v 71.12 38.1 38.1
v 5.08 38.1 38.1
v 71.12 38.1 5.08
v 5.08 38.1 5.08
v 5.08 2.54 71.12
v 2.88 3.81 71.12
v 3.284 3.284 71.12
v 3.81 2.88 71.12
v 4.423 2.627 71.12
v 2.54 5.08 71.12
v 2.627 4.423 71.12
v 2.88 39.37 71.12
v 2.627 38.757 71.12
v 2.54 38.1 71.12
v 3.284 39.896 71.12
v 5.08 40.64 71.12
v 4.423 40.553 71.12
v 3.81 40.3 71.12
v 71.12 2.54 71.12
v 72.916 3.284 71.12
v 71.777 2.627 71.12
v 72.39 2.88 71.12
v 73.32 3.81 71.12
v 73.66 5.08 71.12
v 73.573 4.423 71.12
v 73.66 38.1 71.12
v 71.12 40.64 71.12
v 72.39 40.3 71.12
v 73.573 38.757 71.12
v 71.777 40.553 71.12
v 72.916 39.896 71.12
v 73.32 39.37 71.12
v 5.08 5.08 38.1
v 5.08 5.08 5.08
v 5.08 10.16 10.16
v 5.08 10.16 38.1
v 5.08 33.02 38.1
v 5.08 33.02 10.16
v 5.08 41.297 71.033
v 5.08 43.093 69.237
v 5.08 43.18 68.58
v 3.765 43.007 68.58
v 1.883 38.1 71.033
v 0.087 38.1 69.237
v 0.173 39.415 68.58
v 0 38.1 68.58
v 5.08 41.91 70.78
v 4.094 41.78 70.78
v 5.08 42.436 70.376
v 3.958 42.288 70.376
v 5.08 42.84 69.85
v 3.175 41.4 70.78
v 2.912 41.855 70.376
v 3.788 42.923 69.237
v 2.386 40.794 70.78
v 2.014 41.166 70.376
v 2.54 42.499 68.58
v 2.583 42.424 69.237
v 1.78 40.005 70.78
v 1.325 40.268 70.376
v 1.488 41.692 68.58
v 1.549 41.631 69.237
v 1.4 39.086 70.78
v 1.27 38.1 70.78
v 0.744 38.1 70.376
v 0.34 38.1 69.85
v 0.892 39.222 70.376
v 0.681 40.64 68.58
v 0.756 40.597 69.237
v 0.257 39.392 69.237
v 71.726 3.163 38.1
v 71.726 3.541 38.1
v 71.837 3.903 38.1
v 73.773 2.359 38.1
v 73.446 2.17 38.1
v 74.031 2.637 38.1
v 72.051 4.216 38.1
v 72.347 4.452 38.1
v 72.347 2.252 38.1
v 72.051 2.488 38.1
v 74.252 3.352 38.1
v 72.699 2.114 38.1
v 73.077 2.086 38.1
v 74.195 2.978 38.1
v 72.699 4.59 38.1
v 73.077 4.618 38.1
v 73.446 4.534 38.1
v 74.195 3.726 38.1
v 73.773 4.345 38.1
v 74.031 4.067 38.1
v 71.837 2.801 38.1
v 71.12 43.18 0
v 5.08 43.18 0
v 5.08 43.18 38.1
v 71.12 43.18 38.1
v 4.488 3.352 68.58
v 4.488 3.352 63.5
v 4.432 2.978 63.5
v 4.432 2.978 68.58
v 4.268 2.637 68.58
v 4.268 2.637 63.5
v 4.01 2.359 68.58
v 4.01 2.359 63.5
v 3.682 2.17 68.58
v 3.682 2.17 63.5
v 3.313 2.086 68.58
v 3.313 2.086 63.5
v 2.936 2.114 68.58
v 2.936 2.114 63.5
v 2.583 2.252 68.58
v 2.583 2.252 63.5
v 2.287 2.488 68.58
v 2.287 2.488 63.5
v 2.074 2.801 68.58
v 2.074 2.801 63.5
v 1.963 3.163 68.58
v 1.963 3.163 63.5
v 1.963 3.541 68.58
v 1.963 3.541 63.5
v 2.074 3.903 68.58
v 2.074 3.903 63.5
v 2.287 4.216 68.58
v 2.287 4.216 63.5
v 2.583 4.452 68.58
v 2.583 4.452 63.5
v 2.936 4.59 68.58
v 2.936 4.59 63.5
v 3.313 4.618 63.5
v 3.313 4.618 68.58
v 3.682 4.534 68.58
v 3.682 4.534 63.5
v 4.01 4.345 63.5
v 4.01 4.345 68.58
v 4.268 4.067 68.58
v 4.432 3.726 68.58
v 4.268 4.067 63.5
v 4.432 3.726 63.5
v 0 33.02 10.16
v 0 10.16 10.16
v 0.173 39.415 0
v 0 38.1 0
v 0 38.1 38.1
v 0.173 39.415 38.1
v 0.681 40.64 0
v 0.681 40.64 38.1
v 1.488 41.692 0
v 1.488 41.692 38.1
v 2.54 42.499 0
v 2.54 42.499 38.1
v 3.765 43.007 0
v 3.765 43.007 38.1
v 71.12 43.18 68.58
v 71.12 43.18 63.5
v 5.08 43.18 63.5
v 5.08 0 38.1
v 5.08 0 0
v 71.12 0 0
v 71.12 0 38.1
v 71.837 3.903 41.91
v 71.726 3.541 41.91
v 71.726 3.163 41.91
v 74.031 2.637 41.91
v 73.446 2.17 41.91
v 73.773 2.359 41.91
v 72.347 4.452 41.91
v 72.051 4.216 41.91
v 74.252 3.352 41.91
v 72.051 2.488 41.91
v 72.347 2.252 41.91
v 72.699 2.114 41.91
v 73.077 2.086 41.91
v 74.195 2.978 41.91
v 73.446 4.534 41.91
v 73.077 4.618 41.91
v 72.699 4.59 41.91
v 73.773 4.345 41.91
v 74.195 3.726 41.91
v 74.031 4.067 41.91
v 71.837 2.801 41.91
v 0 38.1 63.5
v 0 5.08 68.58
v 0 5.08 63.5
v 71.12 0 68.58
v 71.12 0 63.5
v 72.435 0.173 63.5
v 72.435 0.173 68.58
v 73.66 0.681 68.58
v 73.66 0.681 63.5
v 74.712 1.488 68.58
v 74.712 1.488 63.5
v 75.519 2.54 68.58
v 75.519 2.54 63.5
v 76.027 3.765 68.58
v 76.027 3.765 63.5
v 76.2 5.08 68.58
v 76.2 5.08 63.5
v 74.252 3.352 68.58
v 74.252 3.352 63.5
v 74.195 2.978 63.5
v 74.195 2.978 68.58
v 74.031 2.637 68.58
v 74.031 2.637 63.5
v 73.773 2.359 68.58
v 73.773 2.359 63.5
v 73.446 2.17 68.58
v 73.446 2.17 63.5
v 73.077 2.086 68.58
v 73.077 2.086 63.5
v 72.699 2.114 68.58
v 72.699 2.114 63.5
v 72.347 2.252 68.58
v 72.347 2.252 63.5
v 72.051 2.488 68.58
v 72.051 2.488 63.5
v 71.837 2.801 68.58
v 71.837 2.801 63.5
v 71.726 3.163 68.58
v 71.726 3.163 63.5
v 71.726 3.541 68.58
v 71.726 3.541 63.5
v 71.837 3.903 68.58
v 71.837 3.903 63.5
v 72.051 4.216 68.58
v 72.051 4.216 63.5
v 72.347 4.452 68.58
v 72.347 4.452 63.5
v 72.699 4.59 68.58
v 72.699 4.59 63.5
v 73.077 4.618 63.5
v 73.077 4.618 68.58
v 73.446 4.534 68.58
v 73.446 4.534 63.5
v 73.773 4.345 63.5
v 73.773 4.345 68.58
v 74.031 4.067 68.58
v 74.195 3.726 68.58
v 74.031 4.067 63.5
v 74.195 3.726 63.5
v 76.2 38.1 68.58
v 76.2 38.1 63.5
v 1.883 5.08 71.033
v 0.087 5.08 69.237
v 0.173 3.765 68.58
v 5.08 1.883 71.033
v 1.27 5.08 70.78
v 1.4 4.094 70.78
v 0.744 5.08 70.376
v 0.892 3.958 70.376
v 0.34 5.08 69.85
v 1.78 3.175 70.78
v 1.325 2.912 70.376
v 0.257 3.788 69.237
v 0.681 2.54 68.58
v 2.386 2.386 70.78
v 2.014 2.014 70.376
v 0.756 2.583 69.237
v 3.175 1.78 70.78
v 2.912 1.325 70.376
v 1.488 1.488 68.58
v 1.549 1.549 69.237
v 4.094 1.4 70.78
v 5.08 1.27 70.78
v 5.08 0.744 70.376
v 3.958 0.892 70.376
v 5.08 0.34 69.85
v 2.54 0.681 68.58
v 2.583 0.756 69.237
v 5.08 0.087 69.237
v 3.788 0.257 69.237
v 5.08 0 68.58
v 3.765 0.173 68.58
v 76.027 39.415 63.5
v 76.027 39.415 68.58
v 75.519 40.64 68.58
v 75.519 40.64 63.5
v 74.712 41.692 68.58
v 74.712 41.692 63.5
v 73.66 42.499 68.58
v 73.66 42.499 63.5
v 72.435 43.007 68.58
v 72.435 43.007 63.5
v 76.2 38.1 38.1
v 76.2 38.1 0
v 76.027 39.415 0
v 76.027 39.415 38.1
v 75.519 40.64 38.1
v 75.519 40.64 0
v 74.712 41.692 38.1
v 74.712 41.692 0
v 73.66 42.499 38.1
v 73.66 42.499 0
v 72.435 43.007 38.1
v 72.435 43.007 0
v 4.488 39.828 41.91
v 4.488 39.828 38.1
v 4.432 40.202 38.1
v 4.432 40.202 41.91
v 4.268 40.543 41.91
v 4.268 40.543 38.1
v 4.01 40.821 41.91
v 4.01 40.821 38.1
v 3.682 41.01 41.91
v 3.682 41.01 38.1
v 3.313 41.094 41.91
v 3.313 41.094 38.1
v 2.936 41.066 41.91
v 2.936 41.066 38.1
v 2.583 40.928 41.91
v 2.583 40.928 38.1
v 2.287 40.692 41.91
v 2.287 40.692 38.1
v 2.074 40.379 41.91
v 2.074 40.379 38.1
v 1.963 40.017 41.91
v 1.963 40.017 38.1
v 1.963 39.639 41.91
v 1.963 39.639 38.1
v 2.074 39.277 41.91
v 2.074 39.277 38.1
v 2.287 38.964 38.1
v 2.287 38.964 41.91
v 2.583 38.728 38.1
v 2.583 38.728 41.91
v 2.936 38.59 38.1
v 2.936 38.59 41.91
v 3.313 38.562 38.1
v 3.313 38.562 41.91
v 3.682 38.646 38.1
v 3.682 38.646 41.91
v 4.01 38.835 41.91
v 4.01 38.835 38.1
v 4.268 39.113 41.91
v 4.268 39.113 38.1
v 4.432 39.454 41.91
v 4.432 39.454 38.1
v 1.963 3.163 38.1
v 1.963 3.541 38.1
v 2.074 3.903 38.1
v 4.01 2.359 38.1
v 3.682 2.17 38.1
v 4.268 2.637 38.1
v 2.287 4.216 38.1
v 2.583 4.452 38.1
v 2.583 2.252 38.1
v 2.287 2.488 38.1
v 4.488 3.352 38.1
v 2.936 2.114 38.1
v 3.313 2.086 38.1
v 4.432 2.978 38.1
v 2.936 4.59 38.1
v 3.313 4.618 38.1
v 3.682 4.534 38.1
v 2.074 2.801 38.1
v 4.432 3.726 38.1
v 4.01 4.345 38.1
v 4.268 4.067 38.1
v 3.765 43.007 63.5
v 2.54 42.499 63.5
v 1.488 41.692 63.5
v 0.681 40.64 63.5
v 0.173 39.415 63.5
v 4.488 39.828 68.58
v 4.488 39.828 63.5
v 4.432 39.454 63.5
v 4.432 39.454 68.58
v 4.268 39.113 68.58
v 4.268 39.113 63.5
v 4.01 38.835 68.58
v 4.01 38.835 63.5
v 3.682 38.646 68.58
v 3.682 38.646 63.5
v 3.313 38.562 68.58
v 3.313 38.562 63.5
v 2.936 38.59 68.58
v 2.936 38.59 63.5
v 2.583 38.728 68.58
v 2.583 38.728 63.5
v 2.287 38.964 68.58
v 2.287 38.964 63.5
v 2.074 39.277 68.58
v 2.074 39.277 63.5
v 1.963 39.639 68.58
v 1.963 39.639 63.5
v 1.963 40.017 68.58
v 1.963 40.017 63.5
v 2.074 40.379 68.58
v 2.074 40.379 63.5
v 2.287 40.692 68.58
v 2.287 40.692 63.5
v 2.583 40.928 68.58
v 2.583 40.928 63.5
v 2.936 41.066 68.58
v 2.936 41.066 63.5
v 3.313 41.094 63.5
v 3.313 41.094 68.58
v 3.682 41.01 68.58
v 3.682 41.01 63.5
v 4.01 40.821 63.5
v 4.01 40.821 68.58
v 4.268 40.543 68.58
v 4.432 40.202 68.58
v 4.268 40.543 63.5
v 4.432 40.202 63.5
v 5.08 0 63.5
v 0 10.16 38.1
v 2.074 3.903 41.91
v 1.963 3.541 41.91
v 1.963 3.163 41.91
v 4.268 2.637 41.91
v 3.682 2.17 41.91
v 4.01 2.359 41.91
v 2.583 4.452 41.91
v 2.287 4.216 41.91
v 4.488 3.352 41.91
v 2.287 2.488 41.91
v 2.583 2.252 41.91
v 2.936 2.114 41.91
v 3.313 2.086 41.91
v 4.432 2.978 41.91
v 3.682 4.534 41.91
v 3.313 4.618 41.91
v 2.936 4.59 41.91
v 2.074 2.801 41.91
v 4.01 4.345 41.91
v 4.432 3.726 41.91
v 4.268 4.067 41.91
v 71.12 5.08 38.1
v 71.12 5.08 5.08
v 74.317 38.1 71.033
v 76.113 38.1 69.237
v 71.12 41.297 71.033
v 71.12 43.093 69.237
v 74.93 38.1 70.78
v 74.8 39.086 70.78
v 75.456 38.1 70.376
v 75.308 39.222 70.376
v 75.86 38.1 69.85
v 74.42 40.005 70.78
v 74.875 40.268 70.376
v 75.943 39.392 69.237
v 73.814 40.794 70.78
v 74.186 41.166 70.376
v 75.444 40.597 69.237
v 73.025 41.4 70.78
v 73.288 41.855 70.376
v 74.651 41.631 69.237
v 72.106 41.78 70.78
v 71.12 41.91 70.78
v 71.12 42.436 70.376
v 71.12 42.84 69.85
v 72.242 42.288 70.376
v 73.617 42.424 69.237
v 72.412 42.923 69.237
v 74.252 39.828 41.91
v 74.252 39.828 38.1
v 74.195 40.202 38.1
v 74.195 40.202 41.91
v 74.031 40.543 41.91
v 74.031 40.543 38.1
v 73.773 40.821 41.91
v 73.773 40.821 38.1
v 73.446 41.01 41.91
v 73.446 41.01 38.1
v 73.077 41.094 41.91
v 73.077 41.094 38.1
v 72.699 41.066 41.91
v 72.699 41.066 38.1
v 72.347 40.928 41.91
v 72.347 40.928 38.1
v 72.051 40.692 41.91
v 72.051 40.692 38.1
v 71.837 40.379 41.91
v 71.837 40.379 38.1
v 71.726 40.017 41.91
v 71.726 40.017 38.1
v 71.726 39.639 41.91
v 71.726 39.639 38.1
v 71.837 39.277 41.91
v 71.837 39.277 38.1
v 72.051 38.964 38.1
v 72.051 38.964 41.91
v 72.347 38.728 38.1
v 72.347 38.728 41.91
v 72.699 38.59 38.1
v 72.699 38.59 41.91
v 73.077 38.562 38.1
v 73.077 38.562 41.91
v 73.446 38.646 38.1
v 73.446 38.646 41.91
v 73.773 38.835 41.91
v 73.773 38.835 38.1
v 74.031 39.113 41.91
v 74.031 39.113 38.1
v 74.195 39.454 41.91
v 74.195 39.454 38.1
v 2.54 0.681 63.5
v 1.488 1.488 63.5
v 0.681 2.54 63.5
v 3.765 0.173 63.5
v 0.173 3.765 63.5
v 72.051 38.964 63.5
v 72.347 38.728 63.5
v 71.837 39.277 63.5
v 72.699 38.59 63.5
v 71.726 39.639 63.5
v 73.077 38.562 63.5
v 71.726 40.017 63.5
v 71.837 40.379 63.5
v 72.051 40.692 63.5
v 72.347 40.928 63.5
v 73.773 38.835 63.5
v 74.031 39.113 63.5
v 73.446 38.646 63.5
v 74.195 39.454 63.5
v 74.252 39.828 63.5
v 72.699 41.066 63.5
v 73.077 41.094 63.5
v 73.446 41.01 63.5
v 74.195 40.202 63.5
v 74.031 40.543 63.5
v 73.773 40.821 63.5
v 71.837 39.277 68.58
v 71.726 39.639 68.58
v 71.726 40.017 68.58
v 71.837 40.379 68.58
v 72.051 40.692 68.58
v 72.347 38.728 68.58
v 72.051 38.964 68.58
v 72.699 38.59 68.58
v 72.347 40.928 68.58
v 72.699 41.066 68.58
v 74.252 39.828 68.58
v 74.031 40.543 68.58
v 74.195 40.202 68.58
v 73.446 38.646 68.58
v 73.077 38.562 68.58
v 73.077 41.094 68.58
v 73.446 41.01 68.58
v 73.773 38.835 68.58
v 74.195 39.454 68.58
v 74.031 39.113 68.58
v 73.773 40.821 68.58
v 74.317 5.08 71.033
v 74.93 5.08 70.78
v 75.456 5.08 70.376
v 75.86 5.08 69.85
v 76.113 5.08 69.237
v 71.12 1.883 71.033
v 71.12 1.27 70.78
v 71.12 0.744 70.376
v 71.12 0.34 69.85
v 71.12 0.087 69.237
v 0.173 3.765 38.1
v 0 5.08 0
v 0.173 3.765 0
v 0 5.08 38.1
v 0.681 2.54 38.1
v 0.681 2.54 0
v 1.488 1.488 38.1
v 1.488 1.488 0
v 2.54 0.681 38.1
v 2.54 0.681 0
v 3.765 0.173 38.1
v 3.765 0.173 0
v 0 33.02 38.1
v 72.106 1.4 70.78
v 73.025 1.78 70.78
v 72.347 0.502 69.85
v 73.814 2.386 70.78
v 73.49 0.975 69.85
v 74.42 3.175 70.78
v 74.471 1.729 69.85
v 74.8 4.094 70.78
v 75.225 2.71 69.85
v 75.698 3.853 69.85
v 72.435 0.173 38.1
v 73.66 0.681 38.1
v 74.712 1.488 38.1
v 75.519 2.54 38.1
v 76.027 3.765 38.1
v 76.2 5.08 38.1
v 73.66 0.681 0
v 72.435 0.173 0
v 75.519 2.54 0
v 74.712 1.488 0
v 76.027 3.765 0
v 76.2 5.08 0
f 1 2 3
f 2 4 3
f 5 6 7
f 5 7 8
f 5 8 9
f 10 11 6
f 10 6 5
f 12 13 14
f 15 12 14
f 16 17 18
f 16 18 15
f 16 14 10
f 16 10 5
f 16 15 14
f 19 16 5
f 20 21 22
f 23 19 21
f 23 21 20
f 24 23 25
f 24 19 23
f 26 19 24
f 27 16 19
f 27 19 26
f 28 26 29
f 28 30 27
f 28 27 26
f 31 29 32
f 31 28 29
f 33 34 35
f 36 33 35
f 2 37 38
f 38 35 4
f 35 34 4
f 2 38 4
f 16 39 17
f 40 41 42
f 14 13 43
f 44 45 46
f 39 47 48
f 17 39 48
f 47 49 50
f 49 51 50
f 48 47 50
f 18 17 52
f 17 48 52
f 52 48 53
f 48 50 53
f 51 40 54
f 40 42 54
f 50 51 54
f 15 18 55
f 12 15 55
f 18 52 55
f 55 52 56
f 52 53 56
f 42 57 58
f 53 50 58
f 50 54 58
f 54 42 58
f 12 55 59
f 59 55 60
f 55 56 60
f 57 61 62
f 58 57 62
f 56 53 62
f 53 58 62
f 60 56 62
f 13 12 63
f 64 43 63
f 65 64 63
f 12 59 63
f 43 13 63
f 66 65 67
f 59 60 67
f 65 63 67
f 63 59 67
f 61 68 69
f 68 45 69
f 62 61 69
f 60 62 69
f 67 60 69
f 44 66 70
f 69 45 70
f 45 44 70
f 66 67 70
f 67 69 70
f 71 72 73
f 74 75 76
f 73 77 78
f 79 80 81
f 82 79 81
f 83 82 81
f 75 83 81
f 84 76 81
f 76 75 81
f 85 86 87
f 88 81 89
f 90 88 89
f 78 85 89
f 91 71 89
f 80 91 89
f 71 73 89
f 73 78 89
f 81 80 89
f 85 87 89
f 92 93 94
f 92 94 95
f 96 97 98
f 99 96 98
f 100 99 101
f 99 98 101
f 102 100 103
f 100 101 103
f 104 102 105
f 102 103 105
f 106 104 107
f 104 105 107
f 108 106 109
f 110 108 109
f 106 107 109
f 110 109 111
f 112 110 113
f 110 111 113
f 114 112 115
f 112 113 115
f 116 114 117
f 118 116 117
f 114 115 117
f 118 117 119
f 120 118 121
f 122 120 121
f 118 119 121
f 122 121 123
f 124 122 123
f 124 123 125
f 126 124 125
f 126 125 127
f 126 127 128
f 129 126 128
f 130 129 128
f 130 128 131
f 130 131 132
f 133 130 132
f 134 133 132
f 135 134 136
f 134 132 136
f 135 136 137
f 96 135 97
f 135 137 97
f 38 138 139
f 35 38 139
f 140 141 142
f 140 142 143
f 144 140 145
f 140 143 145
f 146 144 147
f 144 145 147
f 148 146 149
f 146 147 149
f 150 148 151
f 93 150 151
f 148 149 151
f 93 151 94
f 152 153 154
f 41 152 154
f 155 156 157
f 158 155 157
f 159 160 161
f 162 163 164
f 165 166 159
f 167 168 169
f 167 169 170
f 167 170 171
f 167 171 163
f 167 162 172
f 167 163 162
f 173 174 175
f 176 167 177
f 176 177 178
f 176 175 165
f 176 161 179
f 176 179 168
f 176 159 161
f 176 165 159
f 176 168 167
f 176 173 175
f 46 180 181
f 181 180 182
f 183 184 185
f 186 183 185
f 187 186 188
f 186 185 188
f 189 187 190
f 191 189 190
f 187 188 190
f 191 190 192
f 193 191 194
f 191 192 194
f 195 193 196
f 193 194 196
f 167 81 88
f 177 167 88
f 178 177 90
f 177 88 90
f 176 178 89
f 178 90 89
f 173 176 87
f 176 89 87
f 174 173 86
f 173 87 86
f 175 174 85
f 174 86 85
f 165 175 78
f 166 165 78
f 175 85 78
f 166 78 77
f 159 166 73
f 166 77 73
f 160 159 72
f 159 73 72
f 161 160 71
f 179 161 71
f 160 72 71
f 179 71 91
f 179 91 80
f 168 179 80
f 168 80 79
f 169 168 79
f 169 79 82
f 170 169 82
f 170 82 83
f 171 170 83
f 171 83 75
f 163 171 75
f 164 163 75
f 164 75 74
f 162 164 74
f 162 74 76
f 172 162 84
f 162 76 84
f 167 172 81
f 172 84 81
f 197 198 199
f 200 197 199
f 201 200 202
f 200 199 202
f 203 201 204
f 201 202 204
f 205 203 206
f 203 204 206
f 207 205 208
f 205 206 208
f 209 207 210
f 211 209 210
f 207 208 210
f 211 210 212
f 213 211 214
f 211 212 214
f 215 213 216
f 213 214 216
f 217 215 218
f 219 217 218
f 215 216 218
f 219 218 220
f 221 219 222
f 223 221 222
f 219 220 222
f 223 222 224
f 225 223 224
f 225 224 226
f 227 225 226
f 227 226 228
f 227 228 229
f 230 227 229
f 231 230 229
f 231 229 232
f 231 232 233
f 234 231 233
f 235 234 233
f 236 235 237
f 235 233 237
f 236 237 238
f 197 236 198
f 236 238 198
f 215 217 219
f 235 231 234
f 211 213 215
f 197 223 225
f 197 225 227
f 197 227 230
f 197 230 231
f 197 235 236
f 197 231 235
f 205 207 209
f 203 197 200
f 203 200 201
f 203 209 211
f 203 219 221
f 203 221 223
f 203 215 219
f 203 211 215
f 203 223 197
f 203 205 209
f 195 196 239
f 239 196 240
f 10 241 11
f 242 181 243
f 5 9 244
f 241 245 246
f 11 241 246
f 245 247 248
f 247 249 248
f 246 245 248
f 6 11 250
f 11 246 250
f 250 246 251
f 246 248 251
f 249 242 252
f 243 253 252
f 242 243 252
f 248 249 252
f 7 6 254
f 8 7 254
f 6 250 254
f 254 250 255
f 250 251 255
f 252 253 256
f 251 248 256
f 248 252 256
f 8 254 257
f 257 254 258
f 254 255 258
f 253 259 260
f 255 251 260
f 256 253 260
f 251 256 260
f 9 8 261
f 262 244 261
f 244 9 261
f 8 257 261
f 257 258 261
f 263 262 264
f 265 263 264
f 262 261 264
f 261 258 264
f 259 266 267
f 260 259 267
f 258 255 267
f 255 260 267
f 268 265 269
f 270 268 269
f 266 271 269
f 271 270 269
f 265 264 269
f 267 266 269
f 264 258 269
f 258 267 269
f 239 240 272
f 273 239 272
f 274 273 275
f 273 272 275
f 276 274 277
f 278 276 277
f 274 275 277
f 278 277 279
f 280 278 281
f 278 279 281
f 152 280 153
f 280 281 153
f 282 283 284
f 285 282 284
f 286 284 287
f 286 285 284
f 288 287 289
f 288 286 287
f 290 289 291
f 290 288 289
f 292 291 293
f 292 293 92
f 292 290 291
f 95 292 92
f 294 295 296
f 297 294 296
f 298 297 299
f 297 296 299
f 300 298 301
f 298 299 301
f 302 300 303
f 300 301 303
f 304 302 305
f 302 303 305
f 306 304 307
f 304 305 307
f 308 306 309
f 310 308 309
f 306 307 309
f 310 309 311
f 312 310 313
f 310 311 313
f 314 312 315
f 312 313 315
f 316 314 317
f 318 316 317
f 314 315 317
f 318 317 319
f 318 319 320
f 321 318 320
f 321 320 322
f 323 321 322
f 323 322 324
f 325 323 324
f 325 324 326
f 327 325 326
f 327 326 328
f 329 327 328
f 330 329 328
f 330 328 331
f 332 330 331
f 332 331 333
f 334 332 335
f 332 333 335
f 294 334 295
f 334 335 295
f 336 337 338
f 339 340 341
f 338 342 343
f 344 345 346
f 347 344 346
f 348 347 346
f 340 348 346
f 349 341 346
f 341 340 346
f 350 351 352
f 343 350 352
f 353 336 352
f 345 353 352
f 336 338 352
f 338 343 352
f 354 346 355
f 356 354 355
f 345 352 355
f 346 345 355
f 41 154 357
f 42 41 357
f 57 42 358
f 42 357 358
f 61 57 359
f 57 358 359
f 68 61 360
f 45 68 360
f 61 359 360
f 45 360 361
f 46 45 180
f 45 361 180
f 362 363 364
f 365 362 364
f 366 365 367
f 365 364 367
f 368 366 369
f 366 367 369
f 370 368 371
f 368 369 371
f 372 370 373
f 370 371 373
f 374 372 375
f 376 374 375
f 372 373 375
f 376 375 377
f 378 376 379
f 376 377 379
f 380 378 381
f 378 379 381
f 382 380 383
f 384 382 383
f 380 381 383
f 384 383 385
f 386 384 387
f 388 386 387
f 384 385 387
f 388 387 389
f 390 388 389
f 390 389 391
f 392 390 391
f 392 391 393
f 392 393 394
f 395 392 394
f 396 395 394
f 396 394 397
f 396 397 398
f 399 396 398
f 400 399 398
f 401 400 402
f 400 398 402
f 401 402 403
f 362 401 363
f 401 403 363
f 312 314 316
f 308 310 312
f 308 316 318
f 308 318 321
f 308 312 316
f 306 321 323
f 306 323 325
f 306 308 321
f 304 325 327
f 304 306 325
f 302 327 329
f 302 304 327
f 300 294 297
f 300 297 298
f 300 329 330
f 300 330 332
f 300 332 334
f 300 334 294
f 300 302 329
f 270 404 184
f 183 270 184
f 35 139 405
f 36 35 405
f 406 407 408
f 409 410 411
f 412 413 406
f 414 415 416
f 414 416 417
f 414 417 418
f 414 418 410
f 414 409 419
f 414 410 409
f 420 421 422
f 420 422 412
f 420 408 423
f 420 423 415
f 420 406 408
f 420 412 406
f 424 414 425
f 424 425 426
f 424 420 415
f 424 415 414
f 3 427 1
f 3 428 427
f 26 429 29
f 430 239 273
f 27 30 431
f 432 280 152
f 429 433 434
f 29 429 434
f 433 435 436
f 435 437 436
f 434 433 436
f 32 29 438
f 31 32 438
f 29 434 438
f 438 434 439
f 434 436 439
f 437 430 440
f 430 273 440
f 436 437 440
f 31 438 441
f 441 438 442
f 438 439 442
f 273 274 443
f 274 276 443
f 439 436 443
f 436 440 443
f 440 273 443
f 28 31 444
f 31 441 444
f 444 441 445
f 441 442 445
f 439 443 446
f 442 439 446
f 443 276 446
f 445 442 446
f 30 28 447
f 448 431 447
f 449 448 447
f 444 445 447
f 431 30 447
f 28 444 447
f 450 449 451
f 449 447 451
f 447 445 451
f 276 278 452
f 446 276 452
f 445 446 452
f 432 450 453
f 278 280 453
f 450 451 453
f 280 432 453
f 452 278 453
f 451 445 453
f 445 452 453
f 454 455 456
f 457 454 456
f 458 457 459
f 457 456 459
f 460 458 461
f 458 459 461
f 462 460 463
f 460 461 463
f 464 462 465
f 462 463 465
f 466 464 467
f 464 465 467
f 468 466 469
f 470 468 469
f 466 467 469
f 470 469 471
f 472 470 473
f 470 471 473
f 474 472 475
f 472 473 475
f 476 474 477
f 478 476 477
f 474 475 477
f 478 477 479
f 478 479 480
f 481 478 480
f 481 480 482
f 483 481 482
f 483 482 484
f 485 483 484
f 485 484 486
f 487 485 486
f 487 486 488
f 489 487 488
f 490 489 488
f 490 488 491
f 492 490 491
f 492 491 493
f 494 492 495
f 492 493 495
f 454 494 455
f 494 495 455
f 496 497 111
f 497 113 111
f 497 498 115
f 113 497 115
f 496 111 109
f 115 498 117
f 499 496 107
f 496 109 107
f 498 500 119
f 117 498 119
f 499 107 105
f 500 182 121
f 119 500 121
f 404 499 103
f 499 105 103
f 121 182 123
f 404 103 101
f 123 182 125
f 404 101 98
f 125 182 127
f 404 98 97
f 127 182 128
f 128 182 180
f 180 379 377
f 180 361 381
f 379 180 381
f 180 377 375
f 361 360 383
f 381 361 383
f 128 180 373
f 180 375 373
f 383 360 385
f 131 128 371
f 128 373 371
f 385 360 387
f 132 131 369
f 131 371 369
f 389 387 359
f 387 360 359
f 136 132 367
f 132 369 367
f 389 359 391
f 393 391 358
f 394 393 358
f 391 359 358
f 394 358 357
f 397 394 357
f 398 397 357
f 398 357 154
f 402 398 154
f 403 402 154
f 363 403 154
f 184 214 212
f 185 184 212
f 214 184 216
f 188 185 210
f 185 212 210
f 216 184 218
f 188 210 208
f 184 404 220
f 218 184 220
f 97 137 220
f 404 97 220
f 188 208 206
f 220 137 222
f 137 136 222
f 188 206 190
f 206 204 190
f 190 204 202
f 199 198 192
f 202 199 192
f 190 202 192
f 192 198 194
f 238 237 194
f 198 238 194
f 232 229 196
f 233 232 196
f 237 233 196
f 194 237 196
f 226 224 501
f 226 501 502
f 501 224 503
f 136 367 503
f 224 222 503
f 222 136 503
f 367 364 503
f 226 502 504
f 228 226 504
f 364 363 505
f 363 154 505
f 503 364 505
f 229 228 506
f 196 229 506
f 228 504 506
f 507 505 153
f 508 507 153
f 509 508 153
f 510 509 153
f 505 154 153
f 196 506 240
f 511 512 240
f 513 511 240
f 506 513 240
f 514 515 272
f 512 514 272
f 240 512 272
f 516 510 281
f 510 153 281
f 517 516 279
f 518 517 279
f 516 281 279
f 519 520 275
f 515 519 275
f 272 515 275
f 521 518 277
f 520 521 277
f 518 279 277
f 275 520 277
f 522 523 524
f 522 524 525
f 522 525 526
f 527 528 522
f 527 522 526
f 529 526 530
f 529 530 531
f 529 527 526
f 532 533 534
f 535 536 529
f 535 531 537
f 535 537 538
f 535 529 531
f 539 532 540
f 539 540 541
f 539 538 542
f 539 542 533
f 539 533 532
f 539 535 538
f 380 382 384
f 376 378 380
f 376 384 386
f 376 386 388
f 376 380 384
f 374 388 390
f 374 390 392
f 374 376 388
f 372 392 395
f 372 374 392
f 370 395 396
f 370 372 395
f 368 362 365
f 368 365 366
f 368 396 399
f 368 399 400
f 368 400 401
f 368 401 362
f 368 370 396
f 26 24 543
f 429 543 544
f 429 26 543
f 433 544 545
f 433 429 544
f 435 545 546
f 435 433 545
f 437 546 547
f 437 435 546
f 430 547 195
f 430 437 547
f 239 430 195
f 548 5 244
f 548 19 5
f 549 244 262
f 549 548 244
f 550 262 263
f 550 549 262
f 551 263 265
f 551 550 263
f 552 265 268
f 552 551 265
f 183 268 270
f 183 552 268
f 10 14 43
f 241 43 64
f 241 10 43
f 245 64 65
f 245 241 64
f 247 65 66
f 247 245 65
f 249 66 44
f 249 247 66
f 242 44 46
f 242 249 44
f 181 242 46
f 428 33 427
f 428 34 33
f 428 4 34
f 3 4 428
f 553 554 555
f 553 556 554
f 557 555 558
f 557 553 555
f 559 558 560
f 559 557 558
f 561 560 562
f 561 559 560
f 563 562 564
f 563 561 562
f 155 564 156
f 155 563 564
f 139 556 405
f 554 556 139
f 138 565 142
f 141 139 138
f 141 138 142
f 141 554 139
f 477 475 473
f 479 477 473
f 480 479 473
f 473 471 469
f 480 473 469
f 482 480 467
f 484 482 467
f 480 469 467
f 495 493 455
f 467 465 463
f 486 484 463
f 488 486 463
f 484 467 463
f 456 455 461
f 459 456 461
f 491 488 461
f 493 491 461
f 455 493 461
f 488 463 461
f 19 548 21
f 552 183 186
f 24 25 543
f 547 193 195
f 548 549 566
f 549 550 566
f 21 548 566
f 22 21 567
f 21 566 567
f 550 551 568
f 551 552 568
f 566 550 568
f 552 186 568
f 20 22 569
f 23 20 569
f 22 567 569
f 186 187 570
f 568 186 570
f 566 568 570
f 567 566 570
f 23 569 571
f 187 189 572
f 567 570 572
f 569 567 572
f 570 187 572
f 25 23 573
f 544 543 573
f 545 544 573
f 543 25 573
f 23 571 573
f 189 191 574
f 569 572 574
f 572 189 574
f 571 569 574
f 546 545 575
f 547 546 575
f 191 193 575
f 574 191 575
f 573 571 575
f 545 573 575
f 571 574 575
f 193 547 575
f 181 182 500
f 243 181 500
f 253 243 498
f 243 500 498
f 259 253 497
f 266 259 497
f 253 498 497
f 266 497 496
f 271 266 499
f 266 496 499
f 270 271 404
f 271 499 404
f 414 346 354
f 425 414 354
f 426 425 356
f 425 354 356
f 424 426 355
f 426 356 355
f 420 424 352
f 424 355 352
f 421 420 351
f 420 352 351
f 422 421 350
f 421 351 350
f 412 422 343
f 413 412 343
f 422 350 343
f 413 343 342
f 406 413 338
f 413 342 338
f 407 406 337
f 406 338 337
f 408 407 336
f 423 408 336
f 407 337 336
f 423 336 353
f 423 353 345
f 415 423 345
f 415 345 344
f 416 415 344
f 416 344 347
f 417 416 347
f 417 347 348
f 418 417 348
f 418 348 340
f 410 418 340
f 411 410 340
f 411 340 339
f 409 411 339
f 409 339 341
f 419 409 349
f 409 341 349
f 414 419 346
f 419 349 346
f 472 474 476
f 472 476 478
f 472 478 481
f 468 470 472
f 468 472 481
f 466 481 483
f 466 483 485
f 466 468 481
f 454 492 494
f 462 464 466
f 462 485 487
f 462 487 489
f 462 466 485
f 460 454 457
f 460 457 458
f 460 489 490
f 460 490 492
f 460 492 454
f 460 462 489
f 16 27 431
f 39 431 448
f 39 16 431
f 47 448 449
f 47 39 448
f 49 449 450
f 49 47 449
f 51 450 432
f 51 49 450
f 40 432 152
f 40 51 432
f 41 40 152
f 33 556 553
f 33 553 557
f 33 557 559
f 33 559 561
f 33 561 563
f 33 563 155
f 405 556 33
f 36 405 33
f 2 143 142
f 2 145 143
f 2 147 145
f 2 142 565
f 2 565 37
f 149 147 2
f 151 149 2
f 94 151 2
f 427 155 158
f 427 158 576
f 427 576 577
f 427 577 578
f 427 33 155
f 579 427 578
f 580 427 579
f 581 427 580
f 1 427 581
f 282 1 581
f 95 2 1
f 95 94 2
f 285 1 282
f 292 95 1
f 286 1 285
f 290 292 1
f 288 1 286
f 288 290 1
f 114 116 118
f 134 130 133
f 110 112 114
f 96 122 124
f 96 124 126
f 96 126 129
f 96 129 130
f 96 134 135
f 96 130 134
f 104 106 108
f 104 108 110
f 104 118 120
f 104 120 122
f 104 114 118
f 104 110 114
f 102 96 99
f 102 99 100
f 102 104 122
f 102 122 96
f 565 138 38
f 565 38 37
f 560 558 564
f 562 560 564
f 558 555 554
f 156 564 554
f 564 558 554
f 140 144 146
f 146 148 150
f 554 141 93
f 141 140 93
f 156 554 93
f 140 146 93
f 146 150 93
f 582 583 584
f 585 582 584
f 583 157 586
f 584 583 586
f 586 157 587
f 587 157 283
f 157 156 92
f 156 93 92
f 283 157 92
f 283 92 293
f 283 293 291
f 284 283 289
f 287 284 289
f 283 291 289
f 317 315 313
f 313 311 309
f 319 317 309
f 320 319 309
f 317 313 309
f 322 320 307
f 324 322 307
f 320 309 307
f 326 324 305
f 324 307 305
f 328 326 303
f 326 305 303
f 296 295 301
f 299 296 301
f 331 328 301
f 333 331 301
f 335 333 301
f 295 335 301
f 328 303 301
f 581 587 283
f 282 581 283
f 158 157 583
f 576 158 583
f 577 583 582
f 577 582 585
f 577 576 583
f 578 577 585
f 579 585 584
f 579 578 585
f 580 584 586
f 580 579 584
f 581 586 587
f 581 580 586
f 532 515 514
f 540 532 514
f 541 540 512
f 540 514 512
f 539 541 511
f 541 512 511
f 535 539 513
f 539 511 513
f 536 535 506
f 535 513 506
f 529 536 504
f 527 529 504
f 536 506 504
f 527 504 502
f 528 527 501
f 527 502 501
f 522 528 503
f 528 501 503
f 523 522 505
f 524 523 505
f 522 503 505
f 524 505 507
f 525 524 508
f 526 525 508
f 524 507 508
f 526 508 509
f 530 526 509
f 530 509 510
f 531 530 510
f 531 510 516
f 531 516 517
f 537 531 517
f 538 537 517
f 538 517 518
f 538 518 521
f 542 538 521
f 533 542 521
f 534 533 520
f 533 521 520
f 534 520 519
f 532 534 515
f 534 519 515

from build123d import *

# Parameters (mm, degrees)
F0_W      = 76.2
F0_H      = 43.18
F1_DEPTH  = 38.1
F2_T      = -5.08
F3_R      = 5.08
F4_R      = 1.27
F5_DEPTH  = 3.81
F7_W      = 66.04
F7_H      = 33.02
F8_DEPTH  = 7.62
F9_R      = 1.27
F10_DEPTH = 5.08
F11_R     = 2.54
F12_W     = 22.86
F12_H     = 27.94
F13_DEPTH = 5.08


with BuildPart() as f1:
    # F0 (on Top) → F1 (new body)
    with BuildSketch(Plane.XY):
        with Locations((38.1, 21.59)):
            Rectangle(F0_W, F0_H)
    extrude(amount=F1_DEPTH)

    # F2
    f2_openings = [f1.faces().sort_by_distance(p)[0] for p in [
        (38.1, 21.59, 38.1),
    ]]
    offset(amount=F2_T, openings=f2_openings)

    # F3
    f3_edges = [f1.edges().sort_by_distance(p)[0] for p in [
        (76.2, 43.18, 19.05),
        (76.2, 0, 19.05),
        (0, 0, 19.05),
        (0, 43.18, 19.05),
    ]]
    fillet(f3_edges, radius=F3_R)

    # F12 (on face) → F13 (cut, through all)
    with BuildSketch(Plane(origin=(0, 0, 0), x_dir=(0, -1, 0), z_dir=(-1, 0, 0))):
        with Locations((-21.59, 24.13)):
            Rectangle(F12_W, F12_H)
    extrude(amount=-F13_DEPTH, mode=Mode.SUBTRACT)


with BuildPart() as f5:
    # F4 (on face) → F5 (new body)
    with BuildSketch(Plane.XY.offset(38.1)):
        with Locations((3.2183568498, 3.3520287093)):
            Circle(F4_R)
    extrude(amount=F5_DEPTH)


with BuildPart() as f5b:
    # F4 (on face) → F5, piece 2 (new body)
    with BuildSketch(Plane.XY.offset(38.1)):
        with Locations((3.2183568498, 39.8279712907)):
            Circle(F4_R)
    extrude(amount=F5_DEPTH)


with BuildPart() as f5c:
    # F4 (on face) → F5, piece 3 (new body)
    with BuildSketch(Plane.XY.offset(38.1)):
        with Locations((72.9816431502, 3.3520287093)):
            Circle(F4_R)
    extrude(amount=F5_DEPTH)


with BuildPart() as f5d:
    # F4 (on face) → F5, piece 4 (new body)
    with BuildSketch(Plane.XY.offset(38.1)):
        with Locations((72.9816431502, 39.8279712907)):
            Circle(F4_R)
    extrude(amount=F5_DEPTH)


with BuildPart() as f8:
    # F7 (on offset) → F8 (new body)
    with BuildSketch(Plane.XY.offset(63.5)):
        with BuildLine():
            ThreePointArc((76.2, 38.1), (74.7121024484, 41.6921024484), (71.12, 43.18))
            Line((71.12, 43.18), (5.08, 43.18))
            ThreePointArc((5.08, 43.18), (1.4878975516, 41.6921024484), (0, 38.1))
            Line((0, 38.1), (0, 5.08))
            ThreePointArc((0, 5.08), (1.4878975516, 1.4878975516), (5.08, 0))
            Line((5.08, 0), (71.12, 0))
            ThreePointArc((71.12, 0), (74.7121024484, 1.4878975516), (76.2, 5.08))
            Line((76.2, 5.08), (76.2, 38.1))
        make_face()
        with Locations((38.1, 21.59)):
            Rectangle(F7_W, F7_H, mode=Mode.SUBTRACT)
        with Locations((38.1, 21.59)):
            Rectangle(F7_W, F7_H)
    extrude(amount=F8_DEPTH)

    # F9 (on face) → F10 (cut)
    with BuildSketch(Plane(origin=(0, 0, 63.5), x_dir=(1, 0, 0), z_dir=(0, 0, -1))):
        with Locations((3.2183568498, -3.3520287093)):
            Circle(F9_R)
        with Locations((72.9816431502, -3.3520287093)):
            Circle(F9_R)
        with Locations((72.9816431502, -39.8279712907)):
            Circle(F9_R)
        with Locations((3.2183568498, -39.8279712907)):
            Circle(F9_R)
    extrude(amount=-F10_DEPTH, mode=Mode.SUBTRACT)

    # F11
    f11_edges = [f8.edges().sort_by_distance(p)[0] for p in [
        (74.712102, 1.487898, 71.12),
        (76.2, 21.59, 71.12),
        (74.712102, 41.692102, 71.12),
        (38.1, 43.18, 71.12),
        (1.487898, 41.692102, 71.12),
        (0, 21.59, 71.12),
        (1.487898, 1.487898, 71.12),
        (38.1, 0, 71.12),
    ]]
    fillet(f11_edges, radius=F11_R)


solid = Compound([f1.part, f5.part, f5b.part, f5c.part, f5d.part, f8.part])
